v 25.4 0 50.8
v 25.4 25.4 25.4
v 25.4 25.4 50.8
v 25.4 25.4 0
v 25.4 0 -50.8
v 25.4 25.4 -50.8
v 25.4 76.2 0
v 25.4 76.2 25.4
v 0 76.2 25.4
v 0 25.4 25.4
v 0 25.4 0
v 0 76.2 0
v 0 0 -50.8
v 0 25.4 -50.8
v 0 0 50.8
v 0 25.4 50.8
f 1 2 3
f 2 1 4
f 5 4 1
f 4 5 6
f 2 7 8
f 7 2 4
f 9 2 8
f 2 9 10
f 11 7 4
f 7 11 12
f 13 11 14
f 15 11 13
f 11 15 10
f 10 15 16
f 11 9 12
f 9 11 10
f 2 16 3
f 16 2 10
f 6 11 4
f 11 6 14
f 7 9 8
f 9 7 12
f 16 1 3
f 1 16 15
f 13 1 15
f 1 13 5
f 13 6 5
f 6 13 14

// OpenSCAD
// file: Axis/dark_imperial_12x12x12_origin.scad
// Dark_Imperial_12x12x12_Origin Imperial NetScad.Core Axis Module
// Creates a 3D axis with labeled measurements along the X, Y, and Z axes.
// Parameters:
// - MeasureType: 'Metric' for millimeters or 'Imperial' for inches (default: Metric)
// - IncrementX, IncrementY, IncrementZ: Spacing between labels on each axis (default: 1.5875mm)
// - MinX, MaxX: Minimum and maximum values for the X axis (default: 0 to 300mm)
// - MinY, MaxY: Minimum and maximum values for the Y axis (default: 0 to 300mm)
// - MinZ, MaxZ: Minimum and maximum values for the Z axis (default: 0 to 300mm)

module dark_imperial_12x12x12_origin(colorVal, alpha) {
    color(colorVal, alpha) {
             for (x = [0:6.35:304.8])
{   if(x != 0)
 translate([x - .2, -8.75, -.01]) cube([0.2, 8.75, 0.02]);   }
             for (y = [0:6.35:304.8])
{   if(y != 0)
 translate([-8.75, y - .2, -.01]) cube([8.75, 0.2, 0.02]);   }
             for (z = [0:6.35:304.8])
{   if(z != 0)
 translate([-7.5, -7.5, z-.01]) rotate([90, 45, 135]) cube([0.2, 0.02, 7.5]);   }
             for (x = [0:3.175:304.8])
{   if(x != 0)
 translate([x - .2, -5, -.01]) cube([0.2, 5, 0.02]);   }
             for (y = [0:3.175:304.8])
{   if(y != 0)
 translate([-5, y - .2, -.01]) cube([5, 0.2, 0.02]);   }
             for (z = [0:3.175:304.8])
{   if(z != 0)
 translate([-3.75, -3.75, z-.01]) rotate([90, 45, 135]) cube([0.2, 0.02, 5]);   }
             for (x = [0:1.5875:304.8])
{   if(x != 0)
 translate([x - .2, -2.5, -.01]) cube([0.2, 2.5, 0.02]);   }
             for (y = [0:1.5875:304.8])
{   if(y != 0)
 translate([-2.5, y - .2, -.01]) cube([2.5, 0.2, 0.02]);   }
             for (z = [0:1.5875:304.8])
{   if(z != 0)
 translate([-1.75, -1.75, z-.01]) rotate([90, 45, 135]) cube([0.2, 0.02, 2.5]);   }
             for (x = [0:0.79375:304.8])
{   if(x != 0)
 translate([x - .2, -1.25, -.01]) cube([0.2, 1.25, 0.02]);   }
             for (y = [0:0.79375:304.8])
{   if(y != 0)
 translate([-1.25, y - .2, -.01]) cube([1.25, 0.2, 0.02]);   }
             for (z = [0:0.79375:304.8])
{   if(z != 0)
 translate([-.875, -.875, z-.01]) rotate([90, 45, 135]) cube([0.2, 0.02, 1.25]);   }
             // Axis Labels
             unit = "in";
             scale = 25.4;
             for (i = [0:6.35:304.8])
{   if(i != 0)
 translate([i - 0.875, -10, -.01]) linear_extrude(0.02) rotate(270) text(str(i/scale, unit), size=2);   }
             for (i = [0:6.35:304.8])
{   if(i != 0)
 translate([-10, i + 0.875, -.01]) linear_extrude(0.02) rotate(180) text(str(i/scale, unit), size=2);   }
             for (i = [0:6.35:304.8])
{   if(i != 0)
 translate([-8.75, -8.75, i - .875]) rotate([0,45,135]) linear_extrude(0.02) rotate(90) text(str(i/scale, unit), size=1.75);   }
  }
}
// End of Dark_Imperial_12x12x12_Origin Module
// file: Axis/light_imperial_12x12x12_origin.scad
// Light_Imperial_12x12x12_Origin Imperial NetScad.Core Axis Module
// Creates a 3D axis with labeled measurements along the X, Y, and Z axes.
// Parameters:
// - MeasureType: 'Metric' for millimeters or 'Imperial' for inches (default: Metric)
// - IncrementX, IncrementY, IncrementZ: Spacing between labels on each axis (default: 1.5875mm)
// - MinX, MaxX: Minimum and maximum values for the X axis (default: 0 to 300mm)
// - MinY, MaxY: Minimum and maximum values for the Y axis (default: 0 to 300mm)
// - MinZ, MaxZ: Minimum and maximum values for the Z axis (default: 0 to 300mm)

module light_imperial_12x12x12_origin(colorVal, alpha) {
    color(colorVal, alpha) {
             for (x = [0:6.35:304.8])
{   if(x != 0)
 translate([x - .2, -8.75, -.01]) cube([0.2, 8.75, 0.02]);   }
             for (y = [0:6.35:304.8])
{   if(y != 0)
 translate([-8.75, y - .2, -.01]) cube([8.75, 0.2, 0.02]);   }
             for (z = [0:6.35:304.8])
{   if(z != 0)
 translate([-7.5, -7.5, z-.01]) rotate([90, 45, 135]) cube([0.2, 0.02, 7.5]);   }
             for (x = [0:3.175:304.8])
{   if(x != 0)
 translate([x - .2, -5, -.01]) cube([0.2, 5, 0.02]);   }
             for (y = [0:3.175:304.8])
{   if(y != 0)
 translate([-5, y - .2, -.01]) cube([5, 0.2, 0.02]);   }
             for (z = [0:3.175:304.8])
{   if(z != 0)
 translate([-3.75, -3.75, z-.01]) rotate([90, 45, 135]) cube([0.2, 0.02, 5]);   }
             for (x = [0:1.5875:304.8])
{   if(x != 0)
 translate([x - .2, -2.5, -.01]) cube([0.2, 2.5, 0.02]);   }
             for (y = [0:1.5875:304.8])
{   if(y != 0)
 translate([-2.5, y - .2, -.01]) cube([2.5, 0.2, 0.02]);   }
             for (z = [0:1.5875:304.8])
{   if(z != 0)
 translate([-1.75, -1.75, z-.01]) rotate([90, 45, 135]) cube([0.2, 0.02, 2.5]);   }
             for (x = [0:0.79375:304.8])
{   if(x != 0)
 translate([x - .2, -1.25, -.01]) cube([0.2, 1.25, 0.02]);   }
             for (y = [0:0.79375:304.8])
{   if(y != 0)
 translate([-1.25, y - .2, -.01]) cube([1.25, 0.2, 0.02]);   }
             for (z = [0:0.79375:304.8])
{   if(z != 0)
 translate([-.875, -.875, z-.01]) rotate([90, 45, 135]) cube([0.2, 0.02, 1.25]);   }
             // Axis Labels
             unit = "in";
             scale = 25.4;
             for (i = [0:6.35:304.8])
{   if(i != 0)
 translate([i - 0.875, -10, -.01]) linear_extrude(0.02) rotate(270) text(str(i/scale, unit), size=2);   }
             for (i = [0:6.35:304.8])
{   if(i != 0)
 translate([-10, i + 0.875, -.01]) linear_extrude(0.02) rotate(180) text(str(i/scale, unit), size=2);   }
             for (i = [0:6.35:304.8])
{   if(i != 0)
 translate([-8.75, -8.75, i - .875]) rotate([0,45,135]) linear_extrude(0.02) rotate(90) text(str(i/scale, unit), size=1.75);   }
  }
}
// End of Light_Imperial_12x12x12_Origin Module
// file: Axis/light_metric_300x300x300_origin.scad
// Light_Metric_300x300x300_Origin Metric NetScad.Core Axis Module
// Creates a 3D axis with labeled measurements along the X, Y, and Z axes.
// Parameters:
// - MeasureType: 'Metric' for millimeters or 'Imperial' for inches (default: Metric)
// - IncrementX, IncrementY, IncrementZ: Spacing between labels on each axis (default: 1.5875mm)
// - MinX, MaxX: Minimum and maximum values for the X axis (default: 0 to 300mm)
// - MinY, MaxY: Minimum and maximum values for the Y axis (default: 0 to 300mm)
// - MinZ, MaxZ: Minimum and maximum values for the Z axis (default: 0 to 300mm)

module light_metric_300x300x300_origin(colorVal, alpha) {
    color(colorVal, alpha) {
             for (x = [0:20:300])
{   if(x != 0)
 translate([x - .2, -8.75, -.01]) cube([0.2, 8.75, 0.02]);   }
             for (y = [0:20:300])
{   if(y != 0)
 translate([-8.75, y - .2, -.01]) cube([8.75, 0.2, 0.02]);   }
             for (z = [0:20:300])
{   if(z != 0)
 translate([-7.5, -7.5, z-.01]) rotate([90, 45, 135]) cube([0.2, 0.02, 7.5]);   }
             for (x = [0:10:300])
{   if(x != 0)
 translate([x - .2, -5, -.01]) cube([0.2, 5, 0.02]);   }
             for (y = [0:10:300])
{   if(y != 0)
 translate([-5, y - .2, -.01]) cube([5, 0.2, 0.02]);   }
             for (z = [0:10:300])
{   if(z != 0)
 translate([-3.75, -3.75, z-.01]) rotate([90, 45, 135]) cube([0.2, 0.02, 5]);   }
             for (x = [0:5:300])
{   if(x != 0)
 translate([x - .2, -2.5, -.01]) cube([0.2, 2.5, 0.02]);   }
             for (y = [0:5:300])
{   if(y != 0)
 translate([-2.5, y - .2, -.01]) cube([2.5, 0.2, 0.02]);   }
             for (z = [0:5:300])
{   if(z != 0)
 translate([-1.75, -1.75, z-.01]) rotate([90, 45, 135]) cube([0.2, 0.02, 2.5]);   }
             for (x = [0:1:300])
{   if(x != 0)
 translate([x - .2, -1.25, -.01]) cube([0.2, 1.25, 0.02]);   }
             for (y = [0:1:300])
{   if(y != 0)
 translate([-1.25, y - .2, -.01]) cube([1.25, 0.2, 0.02]);   }
             for (z = [0:1:300])
{   if(z != 0)
 translate([-.875, -.875, z-.01]) rotate([90, 45, 135]) cube([0.2, 0.02, 1.25]);   }
             // Axis Labels
             unit = "mm";
             scale = 1;
             for (i = [0:20:300])
{   if(i != 0)
 translate([i - 0.875, -10, -.01]) linear_extrude(0.02) rotate(270) text(str(i/scale, unit), size=2);   }
             for (i = [0:20:300])
{   if(i != 0)
 translate([-10, i + 0.875, -.01]) linear_extrude(0.02) rotate(180) text(str(i/scale, unit), size=2);   }
             for (i = [0:20:300])
{   if(i != 0)
 translate([-8.75, -8.75, i - .875]) rotate([0,45,135]) linear_extrude(0.02) rotate(90) text(str(i/scale, unit), size=1.75);   }
  }
}
// End of Light_Metric_300x300x300_Origin Module
// file: Axis/light_metric_40x80x120_start_0x0xneg60.scad
// Light_Metric_40x80x120_Start_0x0xNeg60 Metric NetScad.Core Axis Module
// Creates a 3D axis with labeled measurements along the X, Y, and Z axes.
// Parameters:
// - MeasureType: 'Metric' for millimeters or 'Imperial' for inches (default: Metric)
// - IncrementX, IncrementY, IncrementZ: Spacing between labels on each axis (default: 1.5875mm)
// - MinX, MaxX: Minimum and maximum values for the X axis (default: 0 to 300mm)
// - MinY, MaxY: Minimum and maximum values for the Y axis (default: 0 to 300mm)
// - MinZ, MaxZ: Minimum and maximum values for the Z axis (default: 0 to 300mm)

module light_metric_40x80x120_start_0x0xneg60(colorVal, alpha) {
    color(colorVal, alpha) {
             for (x = [0:20:40])
{   if(x != 0)
 translate([x - .2, -8.75, -.01]) cube([0.2, 8.75, 0.02]);   }
             for (y = [0:20:80])
{   if(y != 0)
 translate([-8.75, y - .2, -.01]) cube([8.75, 0.2, 0.02]);   }
             for (z = [-60:20:60])
{   if(z != 0)
 translate([-7.5, -7.5, z-.01]) rotate([90, 45, 135]) cube([0.2, 0.02, 7.5]);   }
             for (x = [0:10:40])
{   if(x != 0)
 translate([x - .2, -5, -.01]) cube([0.2, 5, 0.02]);   }
             for (y = [0:10:80])
{   if(y != 0)
 translate([-5, y - .2, -.01]) cube([5, 0.2, 0.02]);   }
             for (z = [-60:10:60])
{   if(z != 0)
 translate([-3.75, -3.75, z-.01]) rotate([90, 45, 135]) cube([0.2, 0.02, 5]);   }
             for (x = [0:5:40])
{   if(x != 0)
 translate([x - .2, -2.5, -.01]) cube([0.2, 2.5, 0.02]);   }
             for (y = [0:5:80])
{   if(y != 0)
 translate([-2.5, y - .2, -.01]) cube([2.5, 0.2, 0.02]);   }
             for (z = [-60:5:60])
{   if(z != 0)
 translate([-1.75, -1.75, z-.01]) rotate([90, 45, 135]) cube([0.2, 0.02, 2.5]);   }
             for (x = [0:1:40])
{   if(x != 0)
 translate([x - .2, -1.25, -.01]) cube([0.2, 1.25, 0.02]);   }
             for (y = [0:1:80])
{   if(y != 0)
 translate([-1.25, y - .2, -.01]) cube([1.25, 0.2, 0.02]);   }
             for (z = [-60:1:60])
{   if(z != 0)
 translate([-.875, -.875, z-.01]) rotate([90, 45, 135]) cube([0.2, 0.02, 1.25]);   }
             // Axis Labels
             unit = "mm";
             scale = 1;
             for (i = [0:20:40])
{   if(i != 0)
 translate([i - 0.875, -10, -.01]) linear_extrude(0.02) rotate(270) text(str(i/scale, unit), size=2);   }
             for (i = [0:20:80])
{   if(i != 0)
 translate([-10, i + 0.875, -.01]) linear_extrude(0.02) rotate(180) text(str(i/scale, unit), size=2);   }
             for (i = [-60:20:60])
{   if(i != 0)
 translate([-8.75, -8.75, i - .875]) rotate([0,45,135]) linear_extrude(0.02) rotate(90) text(str(i/scale, unit), size=1.75);   }
  }
}
// End of Light_Metric_40x80x120_Start_0x0xNeg60 Module
// file: Axis/dark_imperial_1x3x2_start_0x0xneg2.scad
// Dark_Imperial_1x3x2_Start_0x0xNeg2 Imperial NetScad.Core Axis Module
// Creates a 3D axis with labeled measurements along the X, Y, and Z axes.
// Parameters:
// - MeasureType: 'Metric' for millimeters or 'Imperial' for inches (default: Metric)
// - IncrementX, IncrementY, IncrementZ: Spacing between labels on each axis (default: 1.5875mm)
// - MinX, MaxX: Minimum and maximum values for the X axis (default: 0 to 300mm)
// - MinY, MaxY: Minimum and maximum values for the Y axis (default: 0 to 300mm)
// - MinZ, MaxZ: Minimum and maximum values for the Z axis (default: 0 to 300mm)

module dark_imperial_1x3x2_start_0x0xneg2(colorVal, alpha) {
    color(colorVal, alpha) {
             for (x = [0:6.35:25.4])
{   if(x != 0)
 translate([x - .2, -8.75, -.01]) cube([0.2, 8.75, 0.02]);   }
             for (y = [0:6.35:76.2])
{   if(y != 0)
 translate([-8.75, y - .2, -.01]) cube([8.75, 0.2, 0.02]);   }
             for (z = [-50.8:6.35:12.7])
{   if(z != 0)
 translate([-7.5, -7.5, z-.01]) rotate([90, 45, 135]) cube([0.2, 0.02, 7.5]);   }
             for (x = [0:3.175:25.4])
{   if(x != 0)
 translate([x - .2, -5, -.01]) cube([0.2, 5, 0.02]);   }
             for (y = [0:3.175:76.2])
{   if(y != 0)
 translate([-5, y - .2, -.01]) cube([5, 0.2, 0.02]);   }
             for (z = [-50.8:3.175:12.7])
{   if(z != 0)
 translate([-3.75, -3.75, z-.01]) rotate([90, 45, 135]) cube([0.2, 0.02, 5]);   }
             for (x = [0:1.5875:25.4])
{   if(x != 0)
 translate([x - .2, -2.5, -.01]) cube([0.2, 2.5, 0.02]);   }
             for (y = [0:1.5875:76.2])
{   if(y != 0)
 translate([-2.5, y - .2, -.01]) cube([2.5, 0.2, 0.02]);   }
             for (z = [-50.8:1.5875:12.7])
{   if(z != 0)
 translate([-1.75, -1.75, z-.01]) rotate([90, 45, 135]) cube([0.2, 0.02, 2.5]);   }
             for (x = [0:0.79375:25.4])
{   if(x != 0)
 translate([x - .2, -1.25, -.01]) cube([0.2, 1.25, 0.02]);   }
             for (y = [0:0.79375:76.2])
{   if(y != 0)
 translate([-1.25, y - .2, -.01]) cube([1.25, 0.2, 0.02]);   }
             for (z = [-50.8:0.79375:12.7])
{   if(z != 0)
 translate([-.875, -.875, z-.01]) rotate([90, 45, 135]) cube([0.2, 0.02, 1.25]);   }
             // Axis Labels
             unit = "in";
             scale = 25.4;
             for (i = [0:6.35:25.4])
{   if(i != 0)
 translate([i - 0.875, -10, -.01]) linear_extrude(0.02) rotate(270) text(str(i/scale, unit), size=2);   }
             for (i = [0:6.35:76.2])
{   if(i != 0)
 translate([-10, i + 0.875, -.01]) linear_extrude(0.02) rotate(180) text(str(i/scale, unit), size=2);   }
             for (i = [-50.8:6.35:12.7])
{   if(i != 0)
 translate([-8.75, -8.75, i - .875]) rotate([0,45,135]) linear_extrude(0.02) rotate(90) text(str(i/scale, unit), size=1.75);   }
  }
}
// End of Dark_Imperial_1x3x2_Start_0x0xNeg2 Module
// file: Axis/dark_imperial_24x4x7_start_neg12xneg4xneg6.scad
// Dark_Imperial_24x4x7_Start_Neg12xNeg4xNeg6 Imperial NetScad.Core Axis Module
// Creates a 3D axis with labeled measurements along the X, Y, and Z axes.
// Parameters:
// - MeasureType: 'Metric' for millimeters or 'Imperial' for inches (default: Metric)
// - IncrementX, IncrementY, IncrementZ: Spacing between labels on each axis (default: 1.5875mm)
// - MinX, MaxX: Minimum and maximum values for the X axis (default: 0 to 300mm)
// - MinY, MaxY: Minimum and maximum values for the Y axis (default: 0 to 300mm)
// - MinZ, MaxZ: Minimum and maximum values for the Z axis (default: 0 to 300mm)

module dark_imperial_24x4x7_start_neg12xneg4xneg6(colorVal, alpha) {
    color(colorVal, alpha) {
             for (x = [-304.8:6.35:304.8])
{   if(x != 0)
 translate([x - .2, -8.75, -.01]) cube([0.2, 8.75, 0.02]);   }
             for (y = [-101.6:6.35:0])
{   if(y != 0)
 translate([-8.75, y - .2, -.01]) cube([8.75, 0.2, 0.02]);   }
             for (z = [-152.4:6.35:19.05])
{   if(z != 0)
 translate([-7.5, -7.5, z-.01]) rotate([90, 45, 135]) cube([0.2, 0.02, 7.5]);   }
             for (x = [-304.8:3.175:304.8])
{   if(x != 0)
 translate([x - .2, -5, -.01]) cube([0.2, 5, 0.02]);   }
             for (y = [-101.6:3.175:0])
{   if(y != 0)
 translate([-5, y - .2, -.01]) cube([5, 0.2, 0.02]);   }
             for (z = [-152.4:3.175:19.05])
{   if(z != 0)
 translate([-3.75, -3.75, z-.01]) rotate([90, 45, 135]) cube([0.2, 0.02, 5]);   }
             for (x = [-304.8:1.5875:304.8])
{   if(x != 0)
 translate([x - .2, -2.5, -.01]) cube([0.2, 2.5, 0.02]);   }
             for (y = [-101.6:1.5875:0])
{   if(y != 0)
 translate([-2.5, y - .2, -.01]) cube([2.5, 0.2, 0.02]);   }
             for (z = [-152.4:1.5875:19.05])
{   if(z != 0)
 translate([-1.75, -1.75, z-.01]) rotate([90, 45, 135]) cube([0.2, 0.02, 2.5]);   }
             for (x = [-304.8:0.79375:304.8])
{   if(x != 0)
 translate([x - .2, -1.25, -.01]) cube([0.2, 1.25, 0.02]);   }
             for (y = [-101.6:0.79375:0])
{   if(y != 0)
 translate([-1.25, y - .2, -.01]) cube([1.25, 0.2, 0.02]);   }
             for (z = [-152.4:0.79375:19.05])
{   if(z != 0)
 translate([-.875, -.875, z-.01]) rotate([90, 45, 135]) cube([0.2, 0.02, 1.25]);   }
             // Axis Labels
             unit = "in";
             scale = 25.4;
             for (i = [-304.8:6.35:304.8])
{   if(i != 0)
 translate([i - 0.875, -10, -.01]) linear_extrude(0.02) rotate(270) text(str(i/scale, unit), size=2);   }
             for (i = [-101.6:6.35:0])
{   if(i != 0)
 translate([-10, i + 0.875, -.01]) linear_extrude(0.02) rotate(180) text(str(i/scale, unit), size=2);   }
             for (i = [-152.4:6.35:19.05])
{   if(i != 0)
 translate([-8.75, -8.75, i - .875]) rotate([0,45,135]) linear_extrude(0.02) rotate(90) text(str(i/scale, unit), size=1.75);   }
  }
}
// End of Dark_Imperial_24x4x7_Start_Neg12xNeg4xNeg6 Module
// file: Axis/axes.scad
/******************************************************************************/
// Axes for reference
// Usage: axes(100);
// Options: unit="mm" or "in" (default is "mm")
// For Metric, Axis will set measurements to 20mm, 10mm, 5mm, 1mm increments.
// For Imperial, Axis will be set to 1/4, 1/8, 1/16, and 1/32 inch increments.
// For larger measurements, adjust Min, Max, and Scale accordingly to keep axis readable.
/******************************************************************************/

// 3D Axis Module - Dark Imperial 24x4x7 Start Neg12xNeg4xNeg6
// Calling Method: Get_Dark_Imperial_24x4x7_Start_Neg12xNeg4xNeg6(colorVal, alpha);
// Settings: MeasureType=Imperial, MinX=-304.8, MaxX=304.8, MinY=-101.6, MaxY=0, MinZ=-152.4, MaxZ=19.05
include <dark_imperial_24x4x7_start_neg12xneg4xneg6.scad>;
module Get_Dark_Imperial_24x4x7_Start_Neg12xNeg4xNeg6(colorVal = "White", alpha = 1) {
  dark_imperial_24x4x7_start_neg12xneg4xneg6(colorVal = colorVal, alpha = alpha);
}

// 3D Axis Module - Dark Imperial 1x3x2 Start 0x0xNeg2
// Calling Method: Get_Dark_Imperial_1x3x2_Start_0x0xNeg2(colorVal, alpha);
// Settings: MeasureType=Imperial, MinX=0, MaxX=25.4, MinY=0, MaxY=76.2, MinZ=-50.8, MaxZ=12.7
include <dark_imperial_1x3x2_start_0x0xneg2.scad>;
module Get_Dark_Imperial_1x3x2_Start_0x0xNeg2(colorVal = "White", alpha = 1) {
  dark_imperial_1x3x2_start_0x0xneg2(colorVal = colorVal, alpha = alpha);
}

// 3D Axis Module - Light Metric 40x80x120 Start 0x0xNeg60
// Calling Method: Get_Light_Metric_40x80x120_Start_0x0xNeg60(colorVal, alpha);
// Settings: MeasureType=Metric, MinX=0, MaxX=40, MinY=0, MaxY=80, MinZ=-60, MaxZ=60
include <light_metric_40x80x120_start_0x0xneg60.scad>;
module Get_Light_Metric_40x80x120_Start_0x0xNeg60(colorVal = "Black", alpha = 1) {
  light_metric_40x80x120_start_0x0xneg60(colorVal = colorVal, alpha = alpha);
}

// 3D Axis Module - Light Metric 300x300x300 Origin
// Calling Method: Get_Light_Metric_300x300x300_Origin(colorVal, alpha);
// Settings: MeasureType=Metric, MinX=0, MaxX=300, MinY=0, MaxY=300, MinZ=0, MaxZ=300
include <light_metric_300x300x300_origin.scad>;
module Get_Light_Metric_300x300x300_Origin(colorVal = "Black", alpha = 1) {
  light_metric_300x300x300_origin(colorVal = colorVal, alpha = alpha);
}

// 3D Axis Module - Light Imperial 12x12x12 Origin
// Calling Method: Get_Light_Imperial_12x12x12_Origin(colorVal, alpha);
// Settings: MeasureType=Imperial, MinX=0, MaxX=304.8, MinY=0, MaxY=304.8, MinZ=0, MaxZ=304.8
include <light_imperial_12x12x12_origin.scad>;
module Get_Light_Imperial_12x12x12_Origin(colorVal = "Black", alpha = 1) {
  light_imperial_12x12x12_origin(colorVal = colorVal, alpha = alpha);
}

// 3D Axis Module - Dark Imperial 12x12x12 Origin
// Calling Method: Get_Dark_Imperial_12x12x12_Origin(colorVal, alpha);
// Settings: MeasureType=Imperial, MinX=0, MaxX=304.8, MinY=0, MaxY=304.8, MinZ=0, MaxZ=304.8
include <dark_imperial_12x12x12_origin.scad>;
module Get_Dark_Imperial_12x12x12_Origin(colorVal = "White", alpha = 1) {
  dark_imperial_12x12x12_origin(colorVal = colorVal, alpha = alpha);
}
// main file
// Axes module:
use <Axis/axes.scad>;

// Uncomment one of the following to display the desired axis style and scale

// Metric 1mm increments
//Get_Light_Metric_300x300x300_Origin();
//Get_Light_Metric_40x80x120_Start_0x0xNeg60("blue", 1);

// 1/32 inch increments
//Get_Dark_Imperial_24x4x7_Start_Neg12xNeg4xNeg6();
//Get_Dark_Imperial_1x3x2_Start_0x0xNeg2();
//Get_Dark_Imperial_12x12x12_Origin();

// Basic shapes for scale reference - 1 inch (25.4mm) cube
  for (y = [25.4:25.4:50.8])
	color("purple", 0.25) translate ([0, y, 0]) cube ([25.4, 25.4, 25.4]);
  for (z = [0:25.4:76.2])
	color("purple", 0.25) translate ([0, 0, 25.4 - z]) cube ([25.4, 25.4, 25.4]);
